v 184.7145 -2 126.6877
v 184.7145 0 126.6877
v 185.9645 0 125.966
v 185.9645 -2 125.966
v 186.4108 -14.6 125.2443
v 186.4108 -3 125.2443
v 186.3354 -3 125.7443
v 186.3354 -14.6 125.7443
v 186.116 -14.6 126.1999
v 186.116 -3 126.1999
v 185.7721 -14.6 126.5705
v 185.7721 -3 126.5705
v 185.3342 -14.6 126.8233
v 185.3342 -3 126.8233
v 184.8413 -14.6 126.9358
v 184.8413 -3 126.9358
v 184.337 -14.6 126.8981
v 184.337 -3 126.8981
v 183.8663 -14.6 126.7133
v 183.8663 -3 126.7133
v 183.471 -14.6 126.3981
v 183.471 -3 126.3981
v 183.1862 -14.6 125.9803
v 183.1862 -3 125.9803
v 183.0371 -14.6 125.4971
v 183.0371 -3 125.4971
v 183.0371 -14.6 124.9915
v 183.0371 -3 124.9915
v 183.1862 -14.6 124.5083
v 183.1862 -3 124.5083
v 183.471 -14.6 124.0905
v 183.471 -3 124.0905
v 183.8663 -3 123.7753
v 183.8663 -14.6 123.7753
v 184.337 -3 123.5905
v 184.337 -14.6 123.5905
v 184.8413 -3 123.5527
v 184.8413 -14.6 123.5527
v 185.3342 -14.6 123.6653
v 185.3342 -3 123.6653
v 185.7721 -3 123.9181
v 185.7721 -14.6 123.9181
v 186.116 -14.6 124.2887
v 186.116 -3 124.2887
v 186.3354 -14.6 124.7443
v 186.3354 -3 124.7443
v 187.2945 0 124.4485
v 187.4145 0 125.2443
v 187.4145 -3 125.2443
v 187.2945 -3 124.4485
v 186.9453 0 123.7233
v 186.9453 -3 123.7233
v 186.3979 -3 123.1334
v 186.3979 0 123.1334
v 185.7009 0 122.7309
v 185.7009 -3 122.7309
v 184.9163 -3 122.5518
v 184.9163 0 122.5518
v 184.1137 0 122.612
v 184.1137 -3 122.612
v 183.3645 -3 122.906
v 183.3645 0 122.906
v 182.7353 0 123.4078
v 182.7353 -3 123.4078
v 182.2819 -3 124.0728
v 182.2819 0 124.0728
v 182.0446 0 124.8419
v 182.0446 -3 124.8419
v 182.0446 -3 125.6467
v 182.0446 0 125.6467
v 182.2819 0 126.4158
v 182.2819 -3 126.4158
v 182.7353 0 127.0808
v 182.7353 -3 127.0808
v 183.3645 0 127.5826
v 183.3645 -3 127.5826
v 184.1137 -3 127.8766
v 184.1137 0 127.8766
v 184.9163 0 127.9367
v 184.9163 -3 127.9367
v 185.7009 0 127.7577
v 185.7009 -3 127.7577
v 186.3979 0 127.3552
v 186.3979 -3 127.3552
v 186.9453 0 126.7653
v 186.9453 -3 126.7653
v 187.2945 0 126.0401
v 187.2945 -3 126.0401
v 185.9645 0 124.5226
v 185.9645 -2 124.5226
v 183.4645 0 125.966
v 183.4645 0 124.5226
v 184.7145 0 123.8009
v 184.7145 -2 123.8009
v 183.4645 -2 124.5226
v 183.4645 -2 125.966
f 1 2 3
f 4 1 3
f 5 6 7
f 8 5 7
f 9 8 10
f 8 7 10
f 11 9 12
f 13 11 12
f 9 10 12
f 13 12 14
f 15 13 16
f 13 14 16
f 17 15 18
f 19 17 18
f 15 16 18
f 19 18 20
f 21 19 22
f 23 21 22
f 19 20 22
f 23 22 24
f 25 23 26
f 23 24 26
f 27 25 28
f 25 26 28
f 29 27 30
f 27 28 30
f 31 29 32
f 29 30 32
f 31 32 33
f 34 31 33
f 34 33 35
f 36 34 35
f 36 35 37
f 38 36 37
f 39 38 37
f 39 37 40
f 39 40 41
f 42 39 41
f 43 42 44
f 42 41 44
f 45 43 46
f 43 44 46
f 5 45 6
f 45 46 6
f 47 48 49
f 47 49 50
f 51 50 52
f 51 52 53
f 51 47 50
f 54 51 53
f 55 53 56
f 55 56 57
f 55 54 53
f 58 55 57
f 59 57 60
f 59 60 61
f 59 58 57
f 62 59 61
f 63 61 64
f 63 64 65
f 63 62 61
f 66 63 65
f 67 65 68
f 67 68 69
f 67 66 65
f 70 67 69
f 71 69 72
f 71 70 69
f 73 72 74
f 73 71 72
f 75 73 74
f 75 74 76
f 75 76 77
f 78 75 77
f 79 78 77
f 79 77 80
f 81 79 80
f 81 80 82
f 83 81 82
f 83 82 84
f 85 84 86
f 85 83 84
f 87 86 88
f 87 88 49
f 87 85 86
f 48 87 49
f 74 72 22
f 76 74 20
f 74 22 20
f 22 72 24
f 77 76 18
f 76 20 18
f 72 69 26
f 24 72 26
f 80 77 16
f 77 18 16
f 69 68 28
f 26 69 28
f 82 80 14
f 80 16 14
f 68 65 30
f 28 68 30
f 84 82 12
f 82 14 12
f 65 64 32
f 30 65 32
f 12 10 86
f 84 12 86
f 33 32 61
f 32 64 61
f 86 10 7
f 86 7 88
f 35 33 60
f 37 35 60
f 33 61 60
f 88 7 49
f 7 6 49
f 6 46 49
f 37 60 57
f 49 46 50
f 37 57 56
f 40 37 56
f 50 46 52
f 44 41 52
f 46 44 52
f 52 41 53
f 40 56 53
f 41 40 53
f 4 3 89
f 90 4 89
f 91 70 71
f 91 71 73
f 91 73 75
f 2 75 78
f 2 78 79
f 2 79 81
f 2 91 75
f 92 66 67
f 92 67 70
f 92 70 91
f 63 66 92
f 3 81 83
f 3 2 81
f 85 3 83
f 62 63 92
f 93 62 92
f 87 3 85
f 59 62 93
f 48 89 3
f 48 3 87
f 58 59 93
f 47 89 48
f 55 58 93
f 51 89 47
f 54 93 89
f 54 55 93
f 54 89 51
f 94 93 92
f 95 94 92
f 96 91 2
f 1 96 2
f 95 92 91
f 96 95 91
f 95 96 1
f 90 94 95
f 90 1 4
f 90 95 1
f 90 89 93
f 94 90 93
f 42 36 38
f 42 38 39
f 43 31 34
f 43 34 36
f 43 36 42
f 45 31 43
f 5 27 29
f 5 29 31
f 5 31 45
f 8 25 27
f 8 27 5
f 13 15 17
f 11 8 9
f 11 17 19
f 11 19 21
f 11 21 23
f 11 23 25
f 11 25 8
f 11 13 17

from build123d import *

# Parameters (mm, degrees)
SKETCH1_R           = 2.7
BOSS_EXTRUDE1_DEPTH = 3
SKETCH2_R           = 1.696293742
BOSS_EXTRUDE2_DEPTH = 11.6
CUT_EXTRUDE1_DEPTH  = 2


with BuildPart() as part:
    # Sketch1 → Boss-Extrude1 (new body)
    with BuildSketch(Plane(origin=(0, 0, 0), x_dir=(1, 0, 0), z_dir=(0, 1, 0))):
        with Locations((184.714490272, -125.24429514)):
            Circle(SKETCH1_R)
    extrude(amount=-BOSS_EXTRUDE1_DEPTH)

    # Sketch2 → Boss-Extrude2 (add)
    with BuildSketch(Plane.XZ.offset(3)):
        with Locations((184.714490272, 125.24429514)):
            Circle(SKETCH2_R)
    extrude(amount=BOSS_EXTRUDE2_DEPTH)

    # Sketch3 → Cut-Extrude1 (cut)
    with BuildSketch(Plane(origin=(0, 0, 0), x_dir=(1, 0, 0), z_dir=(0, 1, 0))):
        Polygon((184.714490272, -123.800919467), (183.464490272, -124.522607304), (183.464490272, -125.965982977), (184.714490272, -126.687670813), (185.964490272, -125.965982977), (185.964490272, -124.522607304), align=None)
    extrude(amount=-CUT_EXTRUDE1_DEPTH, mode=Mode.SUBTRACT)


solid = part.part
